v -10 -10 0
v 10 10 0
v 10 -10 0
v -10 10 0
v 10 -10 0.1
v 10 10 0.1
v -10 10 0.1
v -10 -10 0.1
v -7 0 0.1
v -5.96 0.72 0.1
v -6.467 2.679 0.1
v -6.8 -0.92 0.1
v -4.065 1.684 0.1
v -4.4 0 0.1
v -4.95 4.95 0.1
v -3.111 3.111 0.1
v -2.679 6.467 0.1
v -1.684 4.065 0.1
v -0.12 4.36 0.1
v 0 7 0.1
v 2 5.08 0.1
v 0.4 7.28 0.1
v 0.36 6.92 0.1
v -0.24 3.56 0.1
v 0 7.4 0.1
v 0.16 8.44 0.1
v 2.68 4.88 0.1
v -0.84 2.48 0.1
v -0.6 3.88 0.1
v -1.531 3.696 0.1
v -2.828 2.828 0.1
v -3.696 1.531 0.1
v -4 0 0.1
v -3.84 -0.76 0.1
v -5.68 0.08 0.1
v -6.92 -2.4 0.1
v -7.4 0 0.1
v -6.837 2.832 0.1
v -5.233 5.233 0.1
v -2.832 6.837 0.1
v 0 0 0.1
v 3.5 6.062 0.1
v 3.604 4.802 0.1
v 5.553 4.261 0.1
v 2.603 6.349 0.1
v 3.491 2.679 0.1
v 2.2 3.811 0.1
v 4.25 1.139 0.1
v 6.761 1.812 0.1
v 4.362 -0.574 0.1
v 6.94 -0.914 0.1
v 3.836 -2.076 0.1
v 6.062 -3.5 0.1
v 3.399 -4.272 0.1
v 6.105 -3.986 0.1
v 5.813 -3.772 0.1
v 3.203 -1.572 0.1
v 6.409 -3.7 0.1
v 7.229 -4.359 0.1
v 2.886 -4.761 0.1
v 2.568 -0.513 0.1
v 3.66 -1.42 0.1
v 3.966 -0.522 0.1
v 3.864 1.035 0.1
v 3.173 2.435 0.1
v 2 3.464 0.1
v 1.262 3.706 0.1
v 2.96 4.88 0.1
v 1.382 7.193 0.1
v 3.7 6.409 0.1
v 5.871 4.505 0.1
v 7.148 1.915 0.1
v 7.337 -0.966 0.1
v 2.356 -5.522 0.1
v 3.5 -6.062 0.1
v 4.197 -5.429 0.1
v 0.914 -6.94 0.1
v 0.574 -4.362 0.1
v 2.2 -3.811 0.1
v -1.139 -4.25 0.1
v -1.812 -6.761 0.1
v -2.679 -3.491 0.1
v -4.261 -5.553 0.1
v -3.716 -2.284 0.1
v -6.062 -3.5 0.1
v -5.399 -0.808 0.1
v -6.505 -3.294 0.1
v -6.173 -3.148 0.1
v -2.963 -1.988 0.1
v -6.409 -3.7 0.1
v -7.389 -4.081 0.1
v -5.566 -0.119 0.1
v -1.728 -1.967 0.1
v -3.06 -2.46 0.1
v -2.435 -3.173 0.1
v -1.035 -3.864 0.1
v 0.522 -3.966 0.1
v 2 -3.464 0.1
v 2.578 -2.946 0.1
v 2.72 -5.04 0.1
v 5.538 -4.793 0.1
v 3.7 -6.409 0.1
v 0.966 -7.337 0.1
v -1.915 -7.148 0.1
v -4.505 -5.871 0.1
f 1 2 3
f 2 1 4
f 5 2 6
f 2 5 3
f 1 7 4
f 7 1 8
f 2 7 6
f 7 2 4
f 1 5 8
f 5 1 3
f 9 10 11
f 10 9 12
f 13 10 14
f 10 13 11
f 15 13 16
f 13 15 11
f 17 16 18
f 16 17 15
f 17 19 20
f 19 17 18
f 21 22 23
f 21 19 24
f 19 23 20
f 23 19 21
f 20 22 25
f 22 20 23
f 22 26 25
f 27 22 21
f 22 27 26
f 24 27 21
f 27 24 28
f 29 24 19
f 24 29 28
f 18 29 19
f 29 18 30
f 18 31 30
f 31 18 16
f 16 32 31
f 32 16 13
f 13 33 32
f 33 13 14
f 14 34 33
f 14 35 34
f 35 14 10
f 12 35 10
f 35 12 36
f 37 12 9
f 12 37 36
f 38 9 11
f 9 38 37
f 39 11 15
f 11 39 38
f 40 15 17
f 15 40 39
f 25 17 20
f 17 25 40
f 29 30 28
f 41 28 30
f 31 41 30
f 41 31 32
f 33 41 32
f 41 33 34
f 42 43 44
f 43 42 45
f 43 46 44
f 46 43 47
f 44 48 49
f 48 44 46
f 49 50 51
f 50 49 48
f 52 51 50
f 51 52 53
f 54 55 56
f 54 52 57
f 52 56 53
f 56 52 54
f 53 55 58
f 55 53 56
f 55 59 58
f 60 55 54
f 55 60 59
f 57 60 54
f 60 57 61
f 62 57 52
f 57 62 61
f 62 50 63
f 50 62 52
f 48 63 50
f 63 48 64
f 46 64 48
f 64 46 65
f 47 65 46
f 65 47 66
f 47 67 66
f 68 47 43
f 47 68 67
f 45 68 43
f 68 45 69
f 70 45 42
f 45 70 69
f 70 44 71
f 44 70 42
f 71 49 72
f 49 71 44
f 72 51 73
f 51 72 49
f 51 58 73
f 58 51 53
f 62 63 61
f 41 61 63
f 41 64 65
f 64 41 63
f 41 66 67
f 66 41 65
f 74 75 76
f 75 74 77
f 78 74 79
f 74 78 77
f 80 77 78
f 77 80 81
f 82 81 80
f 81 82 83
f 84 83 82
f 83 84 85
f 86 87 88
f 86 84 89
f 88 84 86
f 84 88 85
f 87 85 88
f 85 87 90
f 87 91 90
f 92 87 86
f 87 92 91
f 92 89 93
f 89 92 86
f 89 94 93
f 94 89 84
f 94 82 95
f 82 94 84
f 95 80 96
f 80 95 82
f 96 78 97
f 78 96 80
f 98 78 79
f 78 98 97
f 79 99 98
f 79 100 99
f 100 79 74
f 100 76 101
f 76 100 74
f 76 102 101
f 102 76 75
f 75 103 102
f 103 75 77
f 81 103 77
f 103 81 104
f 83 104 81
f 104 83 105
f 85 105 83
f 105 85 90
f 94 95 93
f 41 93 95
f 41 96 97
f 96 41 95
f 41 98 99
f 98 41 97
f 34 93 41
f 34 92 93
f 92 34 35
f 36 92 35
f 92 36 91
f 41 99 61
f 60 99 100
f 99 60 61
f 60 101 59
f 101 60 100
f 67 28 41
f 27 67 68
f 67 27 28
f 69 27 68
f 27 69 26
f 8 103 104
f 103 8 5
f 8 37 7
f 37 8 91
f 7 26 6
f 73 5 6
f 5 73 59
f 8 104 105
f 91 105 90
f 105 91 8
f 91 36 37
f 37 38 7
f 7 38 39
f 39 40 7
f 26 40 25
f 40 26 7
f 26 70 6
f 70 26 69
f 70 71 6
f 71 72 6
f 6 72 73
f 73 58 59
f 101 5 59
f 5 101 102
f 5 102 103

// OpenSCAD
use <../lib.scad>
function ldraw_lib__59718c() = [
// 0 Sticker  2.5 x  2.5 with Round Green Arrows
// 0 Name: 59718c.dat
// 0 Author: J.C. Tchang [tchang]
// 0 !LDRAW_ORG Part UPDATE 2012-01
// 0 !LICENSE Licensed under CC BY 2.0 and CC BY 4.0 : see CAreadme.txt
// 
// 0 BFC CERTIFY CW
  [0,"BFC","CERTIFY"],
  [0,"BFC","CW"],
// 
// 0 !HISTORY 2012-03-30 [PTadmin] Official Update 2012-01
// 
// 
// 4 15 -25 0 25 -25 0 -25 25 0 -25 25 0 25
  [4,15,-25,0,25,-25,0,-25,25,0,-25,25,0,25],
// 4 15 25 0 25 25 0 -25 25 -0.25 -25 25 -0.25 25
  [4,15,25,0,25,25,0,-25,25,-0.25,-25,25,-0.25,25],
// 4 15 -25 -0.25 25 -25 -0.25 -25 -25 0 -25 -25 0 25
  [4,15,-25,-0.25,25,-25,-0.25,-25,-25,0,-25,-25,0,25],
// 4 15 25 -0.25 25 -25 -0.25 25 -25 0 25 25 0 25
  [4,15,25,-0.25,25,-25,-0.25,25,-25,0,25,25,0,25],
// 4 15 25 0 -25 -25 0 -25 -25 -0.25 -25 25 -0.25 -25
  [4,15,25,0,-25,-25,0,-25,-25,-0.25,-25,25,-0.25,-25],
// 0 //
// 4 2 -16.1679 -0.25 6.697 -14.9 -0.25 1.8 -17 -0.25 -2.3 -17.5 -0.25 0
  [4,2,-16.1679,-0.25,6.697,-14.9,-0.25,1.8,-17,-0.25,-2.3,-17.5,-0.25,0],
// 4 2 -14.9 -0.25 1.8 -16.1679 -0.25 6.697 -10.1627 -0.25 4.2095 -11 -0.25 0
  [4,2,-14.9,-0.25,1.8,-16.1679,-0.25,6.697,-10.1627,-0.25,4.2095,-11,-0.25,0],
// 4 2 -16.1679 -0.25 6.697 -12.3744 -0.25 12.3744 -7.7782 -0.25 7.7782 -10.1627 -0.25 4.2095
  [4,2,-16.1679,-0.25,6.697,-12.3744,-0.25,12.3744,-7.7782,-0.25,7.7782,-10.1627,-0.25,4.2095],
// 4 2 -12.3744 -0.25 12.3744 -6.697 -0.25 16.1679 -4.2095 -0.25 10.1627 -7.7782 -0.25 7.7782
  [4,2,-12.3744,-0.25,12.3744,-6.697,-0.25,16.1679,-4.2095,-0.25,10.1627,-7.7782,-0.25,7.7782],
// 4 2 -4.2095 -0.25 10.1627 -6.697 -0.25 16.1679 0 -0.25 17.5 -0.3 -0.25 10.9
  [4,2,-4.2095,-0.25,10.1627,-6.697,-0.25,16.1679,0,-0.25,17.5,-0.3,-0.25,10.9],
// 3 2 0.9 -0.25 17.3 1 -0.25 18.2 5 -0.25 12.7
  [3,2,0.9,-0.25,17.3,1,-0.25,18.2,5,-0.25,12.7],
// 3 2 -0.6 -0.25 8.9 -0.3 -0.25 10.9 5 -0.25 12.7
  [3,2,-0.6,-0.25,8.9,-0.3,-0.25,10.9,5,-0.25,12.7],
// 4 2 -0.3 -0.25 10.9 0 -0.25 17.5 0.9 -0.25 17.3 5 -0.25 12.7
  [4,2,-0.3,-0.25,10.9,0,-0.25,17.5,0.9,-0.25,17.3,5,-0.25,12.7],
// 4 15 1 -0.25 18.2 0.9 -0.25 17.3 0 -0.25 17.5 0 -0.25 18.5
  [4,15,1,-0.25,18.2,0.9,-0.25,17.3,0,-0.25,17.5,0,-0.25,18.5],
// 3 15 0 -0.25 18.5 0.4 -0.25 21.1 1 -0.25 18.2
  [3,15,0,-0.25,18.5,0.4,-0.25,21.1,1,-0.25,18.2],
// 4 15 5 -0.25 12.7 1 -0.25 18.2 0.4 -0.25 21.1 6.7 -0.25 12.2
  [4,15,5,-0.25,12.7,1,-0.25,18.2,0.4,-0.25,21.1,6.7,-0.25,12.2],
// 4 15 5 -0.25 12.7 6.7 -0.25 12.2 -2.1 -0.25 6.2 -0.6 -0.25 8.9
  [4,15,5,-0.25,12.7,6.7,-0.25,12.2,-2.1,-0.25,6.2,-0.6,-0.25,8.9],
// 4 15 -0.3 -0.25 10.9 -0.6 -0.25 8.9 -2.1 -0.25 6.2 -1.5 -0.25 9.7
  [4,15,-0.3,-0.25,10.9,-0.6,-0.25,8.9,-2.1,-0.25,6.2,-1.5,-0.25,9.7],
// 4 15 -1.5 -0.25 9.7 -3.8268 -0.25 9.2388 -4.2095 -0.25 10.1627 -0.3 -0.25 10.9
  [4,15,-1.5,-0.25,9.7,-3.8268,-0.25,9.2388,-4.2095,-0.25,10.1627,-0.3,-0.25,10.9],
// 4 15 -3.8268 -0.25 9.2388 -7.0711 -0.25 7.0711 -7.7782 -0.25 7.7782 -4.2095 -0.25 10.1627
  [4,15,-3.8268,-0.25,9.2388,-7.0711,-0.25,7.0711,-7.7782,-0.25,7.7782,-4.2095,-0.25,10.1627],
// 4 15 -7.7782 -0.25 7.7782 -7.0711 -0.25 7.0711 -9.2388 -0.25 3.8268 -10.1627 -0.25 4.2095
  [4,15,-7.7782,-0.25,7.7782,-7.0711,-0.25,7.0711,-9.2388,-0.25,3.8268,-10.1627,-0.25,4.2095],
// 4 15 -10.1627 -0.25 4.2095 -9.2388 -0.25 3.8268 -10 -0.25 0 -11 -0.25 0
  [4,15,-10.1627,-0.25,4.2095,-9.2388,-0.25,3.8268,-10,-0.25,0,-11,-0.25,0],
// 3 15 -10 -0.25 0 -9.6 -0.25 -1.9 -11 -0.25 0
  [3,15,-10,-0.25,0,-9.6,-0.25,-1.9,-11,-0.25,0],
// 4 15 -14.9 -0.25 1.8 -11 -0.25 0 -9.6 -0.25 -1.9 -14.2 -0.25 0.2
  [4,15,-14.9,-0.25,1.8,-11,-0.25,0,-9.6,-0.25,-1.9,-14.2,-0.25,0.2],
// 4 15 -14.9 -0.25 1.8 -14.2 -0.25 0.2 -17.3 -0.25 -6 -17 -0.25 -2.3
  [4,15,-14.9,-0.25,1.8,-14.2,-0.25,0.2,-17.3,-0.25,-6,-17,-0.25,-2.3],
// 4 15 -17.3 -0.25 -6 -18.5 -0.25 0 -17.5 -0.25 0 -17 -0.25 -2.3
  [4,15,-17.3,-0.25,-6,-18.5,-0.25,0,-17.5,-0.25,0,-17,-0.25,-2.3],
// 4 15 -17.5 -0.25 0 -18.5 -0.25 0 -17.0918 -0.25 7.0796 -16.1679 -0.25 6.697
  [4,15,-17.5,-0.25,0,-18.5,-0.25,0,-17.0918,-0.25,7.0796,-16.1679,-0.25,6.697],
// 4 15 -17.0918 -0.25 7.0796 -13.0815 -0.25 13.0815 -12.3744 -0.25 12.3744 -16.1679 -0.25 6.697
  [4,15,-17.0918,-0.25,7.0796,-13.0815,-0.25,13.0815,-12.3744,-0.25,12.3744,-16.1679,-0.25,6.697],
// 4 15 -7.0796 -0.25 17.0918 -6.697 -0.25 16.1679 -12.3744 -0.25 12.3744 -13.0815 -0.25 13.0815
  [4,15,-7.0796,-0.25,17.0918,-6.697,-0.25,16.1679,-12.3744,-0.25,12.3744,-13.0815,-0.25,13.0815],
// 4 15 -6.697 -0.25 16.1679 -7.0796 -0.25 17.0918 0 -0.25 18.5 0 -0.25 17.5
  [4,15,-6.697,-0.25,16.1679,-7.0796,-0.25,17.0918,0,-0.25,18.5,0,-0.25,17.5],
// 3 25 -2.1 -0.25 6.2 -3.8268 -0.25 9.2388 -1.5 -0.25 9.7
  [3,25,-2.1,-0.25,6.2,-3.8268,-0.25,9.2388,-1.5,-0.25,9.7],
// 3 25 -3.8268 -0.25 9.2388 -2.1 -0.25 6.2 0 -0.25 0
  [3,25,-3.8268,-0.25,9.2388,-2.1,-0.25,6.2,0,-0.25,0],
// 4 25 -9.2388 -0.25 3.8268 -7.0711 -0.25 7.0711 -3.8268 -0.25 9.2388 0 -0.25 0
  [4,25,-9.2388,-0.25,3.8268,-7.0711,-0.25,7.0711,-3.8268,-0.25,9.2388,0,-0.25,0],
// 4 25 0 -0.25 0 -9.6 -0.25 -1.9 -10 -0.25 0 -9.2388 -0.25 3.8268
  [4,25,0,-0.25,0,-9.6,-0.25,-1.9,-10,-0.25,0,-9.2388,-0.25,3.8268],
// 4 2 13.8837 -0.25 10.6533 9.0089 -0.25 12.0038 6.5081 -0.25 15.8724 8.75 -0.25 15.1554
  [4,2,13.8837,-0.25,10.6533,9.0089,-0.25,12.0038,6.5081,-0.25,15.8724,8.75,-0.25,15.1554],
// 4 2 9.0089 -0.25 12.0038 13.8837 -0.25 10.6533 8.7269 -0.25 6.6964 5.5 -0.25 9.5263
  [4,2,9.0089,-0.25,12.0038,13.8837,-0.25,10.6533,8.7269,-0.25,6.6964,5.5,-0.25,9.5263],
// 4 2 13.8837 -0.25 10.6533 16.9037 -0.25 4.5293 10.6252 -0.25 2.847 8.7269 -0.25 6.6964
  [4,2,13.8837,-0.25,10.6533,16.9037,-0.25,4.5293,10.6252,-0.25,2.847,8.7269,-0.25,6.6964],
// 4 2 16.9037 -0.25 4.5293 17.3503 -0.25 -2.2842 10.9059 -0.25 -1.4358 10.6252 -0.25 2.847
  [4,2,16.9037,-0.25,4.5293,17.3503,-0.25,-2.2842,10.9059,-0.25,-1.4358,10.6252,-0.25,2.847],
// 4 2 10.9059 -0.25 -1.4358 17.3503 -0.25 -2.2842 15.1554 -0.25 -8.75 9.5897 -0.25 -5.1902
  [4,2,10.9059,-0.25,-1.4358,17.3503,-0.25,-2.2842,15.1554,-0.25,-8.75,9.5897,-0.25,-5.1902],
// 3 2 14.5322 -0.25 -9.4294 15.2617 -0.25 -9.966 8.4985 -0.25 -10.6801
  [3,2,14.5322,-0.25,-9.4294,15.2617,-0.25,-9.966,8.4985,-0.25,-10.6801],
// 3 2 8.0076 -0.25 -3.9304 9.5897 -0.25 -5.1902 8.4985 -0.25 -10.6801
  [3,2,8.0076,-0.25,-3.9304,9.5897,-0.25,-5.1902,8.4985,-0.25,-10.6801],
// 4 2 9.5897 -0.25 -5.1902 15.1554 -0.25 -8.75 14.5322 -0.25 -9.4294 8.4985 -0.25 -10.6801
  [4,2,9.5897,-0.25,-5.1902,15.1554,-0.25,-8.75,14.5322,-0.25,-9.4294,8.4985,-0.25,-10.6801],
// 4 15 15.2617 -0.25 -9.966 14.5322 -0.25 -9.4294 15.1554 -0.25 -8.75 16.0215 -0.25 -9.25
  [4,15,15.2617,-0.25,-9.966,14.5322,-0.25,-9.4294,15.1554,-0.25,-8.75,16.0215,-0.25,-9.25],
// 3 15 16.0215 -0.25 -9.25 18.0731 -0.25 -10.8964 15.2617 -0.25 -9.966
  [3,15,16.0215,-0.25,-9.25,18.0731,-0.25,-10.8964,15.2617,-0.25,-9.966],
// 4 15 8.4985 -0.25 -10.6801 15.2617 -0.25 -9.966 18.0731 -0.25 -10.8964 7.2155 -0.25 -11.9024
  [4,15,8.4985,-0.25,-10.6801,15.2617,-0.25,-9.966,18.0731,-0.25,-10.8964,7.2155,-0.25,-11.9024],
// 4 15 8.4985 -0.25 -10.6801 7.2155 -0.25 -11.9024 6.4194 -0.25 -1.2814 8.0076 -0.25 -3.9304
  [4,15,8.4985,-0.25,-10.6801,7.2155,-0.25,-11.9024,6.4194,-0.25,-1.2814,8.0076,-0.25,-3.9304],
// 4 15 9.5897 -0.25 -5.1902 8.0076 -0.25 -3.9304 6.4194 -0.25 -1.2814 9.1504 -0.25 -3.551
  [4,15,9.5897,-0.25,-5.1902,8.0076,-0.25,-3.9304,6.4194,-0.25,-1.2814,9.1504,-0.25,-3.551],
// 4 15 9.1504 -0.25 -3.551 9.9144 -0.25 -1.3053 10.9059 -0.25 -1.4358 9.5897 -0.25 -5.1902
  [4,15,9.1504,-0.25,-3.551,9.9144,-0.25,-1.3053,10.9059,-0.25,-1.4358,9.5897,-0.25,-5.1902],
// 4 15 9.9144 -0.25 -1.3053 9.6593 -0.25 2.5882 10.6252 -0.25 2.847 10.9059 -0.25 -1.4358
  [4,15,9.9144,-0.25,-1.3053,9.6593,-0.25,2.5882,10.6252,-0.25,2.847,10.9059,-0.25,-1.4358],
// 4 15 10.6252 -0.25 2.847 9.6593 -0.25 2.5882 7.9335 -0.25 6.0876 8.7269 -0.25 6.6964
  [4,15,10.6252,-0.25,2.847,9.6593,-0.25,2.5882,7.9335,-0.25,6.0876,8.7269,-0.25,6.6964],
// 4 15 8.7269 -0.25 6.6964 7.9335 -0.25 6.0876 5 -0.25 8.6603 5.5 -0.25 9.5263
  [4,15,8.7269,-0.25,6.6964,7.9335,-0.25,6.0876,5,-0.25,8.6603,5.5,-0.25,9.5263],
// 3 15 5 -0.25 8.6603 3.1546 -0.25 9.2638 5.5 -0.25 9.5263
  [3,15,5,-0.25,8.6603,3.1546,-0.25,9.2638,5.5,-0.25,9.5263],
// 4 15 9.0089 -0.25 12.0038 5.5 -0.25 9.5263 3.1546 -0.25 9.2638 7.4 -0.25 12.2
  [4,15,9.0089,-0.25,12.0038,5.5,-0.25,9.5263,3.1546,-0.25,9.2638,7.4,-0.25,12.2],
// 4 15 9.0089 -0.25 12.0038 7.4 -0.25 12.2 3.4539 -0.25 17.9822 6.5081 -0.25 15.8724
  [4,15,9.0089,-0.25,12.0038,7.4,-0.25,12.2,3.4539,-0.25,17.9822,6.5081,-0.25,15.8724],
// 4 15 3.4539 -0.25 17.9822 9.25 -0.25 16.0215 8.75 -0.25 15.1554 6.5081 -0.25 15.8724
  [4,15,3.4539,-0.25,17.9822,9.25,-0.25,16.0215,8.75,-0.25,15.1554,6.5081,-0.25,15.8724],
// 4 15 8.75 -0.25 15.1554 9.25 -0.25 16.0215 14.677 -0.25 11.2621 13.8837 -0.25 10.6533
  [4,15,8.75,-0.25,15.1554,9.25,-0.25,16.0215,14.677,-0.25,11.2621,13.8837,-0.25,10.6533],
// 4 15 14.677 -0.25 11.2621 17.8697 -0.25 4.7882 16.9037 -0.25 4.5293 13.8837 -0.25 10.6533
  [4,15,14.677,-0.25,11.2621,17.8697,-0.25,4.7882,16.9037,-0.25,4.5293,13.8837,-0.25,10.6533],
// 4 15 18.3417 -0.25 -2.4148 17.3503 -0.25 -2.2842 16.9037 -0.25 4.5293 17.8697 -0.25 4.7882
  [4,15,18.3417,-0.25,-2.4148,17.3503,-0.25,-2.2842,16.9037,-0.25,4.5293,17.8697,-0.25,4.7882],
// 4 15 17.3503 -0.25 -2.2842 18.3417 -0.25 -2.4148 16.0215 -0.25 -9.25 15.1554 -0.25 -8.75
  [4,15,17.3503,-0.25,-2.2842,18.3417,-0.25,-2.4148,16.0215,-0.25,-9.25,15.1554,-0.25,-8.75],
// 3 25 6.4194 -0.25 -1.2814 9.9144 -0.25 -1.3053 9.1504 -0.25 -3.551
  [3,25,6.4194,-0.25,-1.2814,9.9144,-0.25,-1.3053,9.1504,-0.25,-3.551],
// 3 25 9.9144 -0.25 -1.3053 6.4194 -0.25 -1.2814 0 -0.25 0
  [3,25,9.9144,-0.25,-1.3053,6.4194,-0.25,-1.2814,0,-0.25,0],
// 4 25 7.9335 -0.25 6.0876 9.6593 -0.25 2.5882 9.9144 -0.25 -1.3053 0 -0.25 0
  [4,25,7.9335,-0.25,6.0876,9.6593,-0.25,2.5882,9.9144,-0.25,-1.3053,0,-0.25,0],
// 4 25 0 -0.25 0 3.1546 -0.25 9.2638 5 -0.25 8.6603 7.9335 -0.25 6.0876
  [4,25,0,-0.25,0,3.1546,-0.25,9.2638,5,-0.25,8.6603,7.9335,-0.25,6.0876],
// 4 2 2.2842 -0.25 -17.3503 5.8912 -0.25 -13.8038 10.4919 -0.25 -13.5724 8.75 -0.25 -15.1554
  [4,2,2.2842,-0.25,-17.3503,5.8912,-0.25,-13.8038,10.4919,-0.25,-13.5724,8.75,-0.25,-15.1554],
// 4 2 5.8912 -0.25 -13.8038 2.2842 -0.25 -17.3503 1.4358 -0.25 -10.9059 5.5 -0.25 -9.5263
  [4,2,5.8912,-0.25,-13.8038,2.2842,-0.25,-17.3503,1.4358,-0.25,-10.9059,5.5,-0.25,-9.5263],
// 4 2 2.2842 -0.25 -17.3503 -4.5293 -0.25 -16.9037 -2.847 -0.25 -10.6252 1.4358 -0.25 -10.9059
  [4,2,2.2842,-0.25,-17.3503,-4.5293,-0.25,-16.9037,-2.847,-0.25,-10.6252,1.4358,-0.25,-10.9059],
// 4 2 -4.5293 -0.25 -16.9037 -10.6533 -0.25 -13.8837 -6.6964 -0.25 -8.7269 -2.847 -0.25 -10.6252
  [4,2,-4.5293,-0.25,-16.9037,-10.6533,-0.25,-13.8837,-6.6964,-0.25,-8.7269,-2.847,-0.25,-10.6252],
// 4 2 -6.6964 -0.25 -8.7269 -10.6533 -0.25 -13.8837 -15.1554 -0.25 -8.75 -9.2897 -0.25 -5.7098
  [4,2,-6.6964,-0.25,-8.7269,-10.6533,-0.25,-13.8837,-15.1554,-0.25,-8.75,-9.2897,-0.25,-5.7098],
// 3 2 -15.4322 -0.25 -7.8706 -16.2617 -0.25 -8.234 -13.4985 -0.25 -2.0199
  [3,2,-15.4322,-0.25,-7.8706,-16.2617,-0.25,-8.234,-13.4985,-0.25,-2.0199],
// 3 2 -7.4076 -0.25 -4.9696 -9.2897 -0.25 -5.7098 -13.4985 -0.25 -2.0199
  [3,2,-7.4076,-0.25,-4.9696,-9.2897,-0.25,-5.7098,-13.4985,-0.25,-2.0199],
// 4 2 -9.2897 -0.25 -5.7098 -15.1554 -0.25 -8.75 -15.4322 -0.25 -7.8706 -13.4985 -0.25 -2.0199
  [4,2,-9.2897,-0.25,-5.7098,-15.1554,-0.25,-8.75,-15.4322,-0.25,-7.8706,-13.4985,-0.25,-2.0199],
// 4 15 -16.2617 -0.25 -8.234 -15.4322 -0.25 -7.8706 -15.1554 -0.25 -8.75 -16.0215 -0.25 -9.25
  [4,15,-16.2617,-0.25,-8.234,-15.4322,-0.25,-7.8706,-15.1554,-0.25,-8.75,-16.0215,-0.25,-9.25],
// 3 15 -16.0215 -0.25 -9.25 -18.4731 -0.25 -10.2036 -16.2617 -0.25 -8.234
  [3,15,-16.0215,-0.25,-9.25,-18.4731,-0.25,-10.2036,-16.2617,-0.25,-8.234],
// 4 15 -13.4985 -0.25 -2.0199 -16.2617 -0.25 -8.234 -18.4731 -0.25 -10.2036 -13.9155 -0.25 -0.2976
  [4,15,-13.4985,-0.25,-2.0199,-16.2617,-0.25,-8.234,-18.4731,-0.25,-10.2036,-13.9155,-0.25,-0.2976],
// 4 15 -13.4985 -0.25 -2.0199 -13.9155 -0.25 -0.2976 -4.3194 -0.25 -4.9187 -7.4076 -0.25 -4.9696
  [4,15,-13.4985,-0.25,-2.0199,-13.9155,-0.25,-0.2976,-4.3194,-0.25,-4.9187,-7.4076,-0.25,-4.9696],
// 4 15 -9.2897 -0.25 -5.7098 -7.4076 -0.25 -4.9696 -4.3194 -0.25 -4.9187 -7.6504 -0.25 -6.149
  [4,15,-9.2897,-0.25,-5.7098,-7.4076,-0.25,-4.9696,-4.3194,-0.25,-4.9187,-7.6504,-0.25,-6.149],
// 4 15 -7.6504 -0.25 -6.149 -6.0876 -0.25 -7.9335 -6.6964 -0.25 -8.7269 -9.2897 -0.25 -5.7098
  [4,15,-7.6504,-0.25,-6.149,-6.0876,-0.25,-7.9335,-6.6964,-0.25,-8.7269,-9.2897,-0.25,-5.7098],
// 4 15 -6.0876 -0.25 -7.9335 -2.5882 -0.25 -9.6593 -2.847 -0.25 -10.6252 -6.6964 -0.25 -8.7269
  [4,15,-6.0876,-0.25,-7.9335,-2.5882,-0.25,-9.6593,-2.847,-0.25,-10.6252,-6.6964,-0.25,-8.7269],
// 4 15 -2.847 -0.25 -10.6252 -2.5882 -0.25 -9.6593 1.3053 -0.25 -9.9144 1.4358 -0.25 -10.9059
  [4,15,-2.847,-0.25,-10.6252,-2.5882,-0.25,-9.6593,1.3053,-0.25,-9.9144,1.4358,-0.25,-10.9059],
// 4 15 1.4358 -0.25 -10.9059 1.3053 -0.25 -9.9144 5 -0.25 -8.6603 5.5 -0.25 -9.5263
  [4,15,1.4358,-0.25,-10.9059,1.3053,-0.25,-9.9144,5,-0.25,-8.6603,5.5,-0.25,-9.5263],
// 3 15 5 -0.25 -8.6603 6.4455 -0.25 -7.3638 5.5 -0.25 -9.5263
  [3,15,5,-0.25,-8.6603,6.4455,-0.25,-7.3638,5.5,-0.25,-9.5263],
// 4 15 5.8912 -0.25 -13.8038 5.5 -0.25 -9.5263 6.4455 -0.25 -7.3638 6.8 -0.25 -12.6
  [4,15,5.8912,-0.25,-13.8038,5.5,-0.25,-9.5263,6.4455,-0.25,-7.3638,6.8,-0.25,-12.6],
// 4 15 5.8912 -0.25 -13.8038 6.8 -0.25 -12.6 13.8462 -0.25 -11.9822 10.4919 -0.25 -13.5724
  [4,15,5.8912,-0.25,-13.8038,6.8,-0.25,-12.6,13.8462,-0.25,-11.9822,10.4919,-0.25,-13.5724],
// 4 15 13.8462 -0.25 -11.9822 9.25 -0.25 -16.0215 8.75 -0.25 -15.1554 10.4919 -0.25 -13.5724
  [4,15,13.8462,-0.25,-11.9822,9.25,-0.25,-16.0215,8.75,-0.25,-15.1554,10.4919,-0.25,-13.5724],
// 4 15 8.75 -0.25 -15.1554 9.25 -0.25 -16.0215 2.4148 -0.25 -18.3417 2.2842 -0.25 -17.3503
  [4,15,8.75,-0.25,-15.1554,9.25,-0.25,-16.0215,2.4148,-0.25,-18.3417,2.2842,-0.25,-17.3503],
// 4 15 2.4148 -0.25 -18.3417 -4.7882 -0.25 -17.8697 -4.5293 -0.25 -16.9037 2.2842 -0.25 -17.3503
  [4,15,2.4148,-0.25,-18.3417,-4.7882,-0.25,-17.8697,-4.5293,-0.25,-16.9037,2.2842,-0.25,-17.3503],
// 4 15 -11.2621 -0.25 -14.677 -10.6533 -0.25 -13.8837 -4.5293 -0.25 -16.9037 -4.7882 -0.25 -17.8697
  [4,15,-11.2621,-0.25,-14.677,-10.6533,-0.25,-13.8837,-4.5293,-0.25,-16.9037,-4.7882,-0.25,-17.8697],
// 4 15 -10.6533 -0.25 -13.8837 -11.2621 -0.25 -14.677 -16.0215 -0.25 -9.25 -15.1554 -0.25 -8.75
  [4,15,-10.6533,-0.25,-13.8837,-11.2621,-0.25,-14.677,-16.0215,-0.25,-9.25,-15.1554,-0.25,-8.75],
// 3 25 -4.3194 -0.25 -4.9187 -6.0876 -0.25 -7.9335 -7.6504 -0.25 -6.149
  [3,25,-4.3194,-0.25,-4.9187,-6.0876,-0.25,-7.9335,-7.6504,-0.25,-6.149],
// 3 25 -6.0876 -0.25 -7.9335 -4.3194 -0.25 -4.9187 0 -0.25 0
  [3,25,-6.0876,-0.25,-7.9335,-4.3194,-0.25,-4.9187,0,-0.25,0],
// 4 25 1.3053 -0.25 -9.9144 -2.5882 -0.25 -9.6593 -6.0876 -0.25 -7.9335 0 -0.25 0
  [4,25,1.3053,-0.25,-9.9144,-2.5882,-0.25,-9.6593,-6.0876,-0.25,-7.9335,0,-0.25,0],
// 4 25 0 -0.25 0 6.4455 -0.25 -7.3638 5 -0.25 -8.6603 1.3053 -0.25 -9.9144
  [4,25,0,-0.25,0,6.4455,-0.25,-7.3638,5,-0.25,-8.6603,1.3053,-0.25,-9.9144],
// 3 25 0 -0.25 0 -4.3194 -0.25 -4.9187 -9.6 -0.25 -1.9
  [3,25,0,-0.25,0,-4.3194,-0.25,-4.9187,-9.6,-0.25,-1.9],
// 4 25 -9.6 -0.25 -1.9 -4.3194 -0.25 -4.9187 -13.9155 -0.25 -0.2976 -14.2 -0.25 0.2
  [4,25,-9.6,-0.25,-1.9,-4.3194,-0.25,-4.9187,-13.9155,-0.25,-0.2976,-14.2,-0.25,0.2],
// 4 25 -13.9155 -0.25 -0.2976 -18.4731 -0.25 -10.2036 -17.3 -0.25 -6 -14.2 -0.25 0.2
  [4,25,-13.9155,-0.25,-0.2976,-18.4731,-0.25,-10.2036,-17.3,-0.25,-6,-14.2,-0.25,0.2],
// 3 25 6.4194 -0.25 -1.2814 6.4455 -0.25 -7.3638 0 -0.25 0
  [3,25,6.4194,-0.25,-1.2814,6.4455,-0.25,-7.3638,0,-0.25,0],
// 4 25 7.2155 -0.25 -11.9024 6.8 -0.25 -12.6 6.4455 -0.25 -7.3638 6.4194 -0.25 -1.2814
  [4,25,7.2155,-0.25,-11.9024,6.8,-0.25,-12.6,6.4455,-0.25,-7.3638,6.4194,-0.25,-1.2814],
// 4 25 6.8 -0.25 -12.6 7.2155 -0.25 -11.9024 18.0731 -0.25 -10.8964 13.8462 -0.25 -11.9822
  [4,25,6.8,-0.25,-12.6,7.2155,-0.25,-11.9024,18.0731,-0.25,-10.8964,13.8462,-0.25,-11.9822],
// 3 25 0 -0.25 0 -2.1 -0.25 6.2 3.1546 -0.25 9.2638
  [3,25,0,-0.25,0,-2.1,-0.25,6.2,3.1546,-0.25,9.2638],
// 4 25 7.4 -0.25 12.2 3.1546 -0.25 9.2638 -2.1 -0.25 6.2 6.7 -0.25 12.2
  [4,25,7.4,-0.25,12.2,3.1546,-0.25,9.2638,-2.1,-0.25,6.2,6.7,-0.25,12.2],
// 4 25 3.4539 -0.25 17.9822 7.4 -0.25 12.2 6.7 -0.25 12.2 0.4 -0.25 21.1
  [4,25,3.4539,-0.25,17.9822,7.4,-0.25,12.2,6.7,-0.25,12.2,0.4,-0.25,21.1],
// 4 25 2.4148 -0.25 -18.3417 25 -0.25 -25 -25 -0.25 -25 -4.7882 -0.25 -17.8697
  [4,25,2.4148,-0.25,-18.3417,25,-0.25,-25,-25,-0.25,-25,-4.7882,-0.25,-17.8697],
// 4 25 -25 -0.25 25 -18.5 -0.25 0 -18.4731 -0.25 -10.2036 -25 -0.25 -25
  [4,25,-25,-0.25,25,-18.5,-0.25,0,-18.4731,-0.25,-10.2036,-25,-0.25,-25],
// 3 25 25 -0.25 25 0.4 -0.25 21.1 -25 -0.25 25
  [3,25,25,-0.25,25,0.4,-0.25,21.1,-25,-0.25,25],
// 4 25 25 -0.25 -25 18.0731 -0.25 -10.8964 18.3417 -0.25 -2.4148 25 -0.25 25
  [4,25,25,-0.25,-25,18.0731,-0.25,-10.8964,18.3417,-0.25,-2.4148,25,-0.25,25],
// 3 25 -11.2621 -0.25 -14.677 -4.7882 -0.25 -17.8697 -25 -0.25 -25
  [3,25,-11.2621,-0.25,-14.677,-4.7882,-0.25,-17.8697,-25,-0.25,-25],
// 4 25 -25 -0.25 -25 -18.4731 -0.25 -10.2036 -16.0215 -0.25 -9.25 -11.2621 -0.25 -14.677
  [4,25,-25,-0.25,-25,-18.4731,-0.25,-10.2036,-16.0215,-0.25,-9.25,-11.2621,-0.25,-14.677],
// 3 25 -18.5 -0.25 0 -17.3 -0.25 -6 -18.4731 -0.25 -10.2036
  [3,25,-18.5,-0.25,0,-17.3,-0.25,-6,-18.4731,-0.25,-10.2036],
// 3 25 -25 -0.25 25 -17.0918 -0.25 7.0796 -18.5 -0.25 0
  [3,25,-25,-0.25,25,-17.0918,-0.25,7.0796,-18.5,-0.25,0],
// 3 25 -13.0815 -0.25 13.0815 -17.0918 -0.25 7.0796 -25 -0.25 25
  [3,25,-13.0815,-0.25,13.0815,-17.0918,-0.25,7.0796,-25,-0.25,25],
// 3 25 -25 -0.25 25 -7.0796 -0.25 17.0918 -13.0815 -0.25 13.0815
  [3,25,-25,-0.25,25,-7.0796,-0.25,17.0918,-13.0815,-0.25,13.0815],
// 4 25 0.4 -0.25 21.1 0 -0.25 18.5 -7.0796 -0.25 17.0918 -25 -0.25 25
  [4,25,0.4,-0.25,21.1,0,-0.25,18.5,-7.0796,-0.25,17.0918,-25,-0.25,25],
// 4 25 25 -0.25 25 9.25 -0.25 16.0215 3.4539 -0.25 17.9822 0.4 -0.25 21.1
  [4,25,25,-0.25,25,9.25,-0.25,16.0215,3.4539,-0.25,17.9822,0.4,-0.25,21.1],
// 3 25 25 -0.25 25 14.677 -0.25 11.2621 9.25 -0.25 16.0215
  [3,25,25,-0.25,25,14.677,-0.25,11.2621,9.25,-0.25,16.0215],
// 3 25 25 -0.25 25 17.8697 -0.25 4.7882 14.677 -0.25 11.2621
  [3,25,25,-0.25,25,17.8697,-0.25,4.7882,14.677,-0.25,11.2621],
// 3 25 18.3417 -0.25 -2.4148 17.8697 -0.25 4.7882 25 -0.25 25
  [3,25,18.3417,-0.25,-2.4148,17.8697,-0.25,4.7882,25,-0.25,25],
// 3 25 18.0731 -0.25 -10.8964 16.0215 -0.25 -9.25 18.3417 -0.25 -2.4148
  [3,25,18.0731,-0.25,-10.8964,16.0215,-0.25,-9.25,18.3417,-0.25,-2.4148],
// 4 25 9.25 -0.25 -16.0215 13.8462 -0.25 -11.9822 18.0731 -0.25 -10.8964 25 -0.25 -25
  [4,25,9.25,-0.25,-16.0215,13.8462,-0.25,-11.9822,18.0731,-0.25,-10.8964,25,-0.25,-25],
// 3 25 2.4148 -0.25 -18.3417 9.25 -0.25 -16.0215 25 -0.25 -25
  [3,25,2.4148,-0.25,-18.3417,9.25,-0.25,-16.0215,25,-0.25,-25],
// 0 //
];
makepoly(ldraw_lib__59718c(), line=0.2);
